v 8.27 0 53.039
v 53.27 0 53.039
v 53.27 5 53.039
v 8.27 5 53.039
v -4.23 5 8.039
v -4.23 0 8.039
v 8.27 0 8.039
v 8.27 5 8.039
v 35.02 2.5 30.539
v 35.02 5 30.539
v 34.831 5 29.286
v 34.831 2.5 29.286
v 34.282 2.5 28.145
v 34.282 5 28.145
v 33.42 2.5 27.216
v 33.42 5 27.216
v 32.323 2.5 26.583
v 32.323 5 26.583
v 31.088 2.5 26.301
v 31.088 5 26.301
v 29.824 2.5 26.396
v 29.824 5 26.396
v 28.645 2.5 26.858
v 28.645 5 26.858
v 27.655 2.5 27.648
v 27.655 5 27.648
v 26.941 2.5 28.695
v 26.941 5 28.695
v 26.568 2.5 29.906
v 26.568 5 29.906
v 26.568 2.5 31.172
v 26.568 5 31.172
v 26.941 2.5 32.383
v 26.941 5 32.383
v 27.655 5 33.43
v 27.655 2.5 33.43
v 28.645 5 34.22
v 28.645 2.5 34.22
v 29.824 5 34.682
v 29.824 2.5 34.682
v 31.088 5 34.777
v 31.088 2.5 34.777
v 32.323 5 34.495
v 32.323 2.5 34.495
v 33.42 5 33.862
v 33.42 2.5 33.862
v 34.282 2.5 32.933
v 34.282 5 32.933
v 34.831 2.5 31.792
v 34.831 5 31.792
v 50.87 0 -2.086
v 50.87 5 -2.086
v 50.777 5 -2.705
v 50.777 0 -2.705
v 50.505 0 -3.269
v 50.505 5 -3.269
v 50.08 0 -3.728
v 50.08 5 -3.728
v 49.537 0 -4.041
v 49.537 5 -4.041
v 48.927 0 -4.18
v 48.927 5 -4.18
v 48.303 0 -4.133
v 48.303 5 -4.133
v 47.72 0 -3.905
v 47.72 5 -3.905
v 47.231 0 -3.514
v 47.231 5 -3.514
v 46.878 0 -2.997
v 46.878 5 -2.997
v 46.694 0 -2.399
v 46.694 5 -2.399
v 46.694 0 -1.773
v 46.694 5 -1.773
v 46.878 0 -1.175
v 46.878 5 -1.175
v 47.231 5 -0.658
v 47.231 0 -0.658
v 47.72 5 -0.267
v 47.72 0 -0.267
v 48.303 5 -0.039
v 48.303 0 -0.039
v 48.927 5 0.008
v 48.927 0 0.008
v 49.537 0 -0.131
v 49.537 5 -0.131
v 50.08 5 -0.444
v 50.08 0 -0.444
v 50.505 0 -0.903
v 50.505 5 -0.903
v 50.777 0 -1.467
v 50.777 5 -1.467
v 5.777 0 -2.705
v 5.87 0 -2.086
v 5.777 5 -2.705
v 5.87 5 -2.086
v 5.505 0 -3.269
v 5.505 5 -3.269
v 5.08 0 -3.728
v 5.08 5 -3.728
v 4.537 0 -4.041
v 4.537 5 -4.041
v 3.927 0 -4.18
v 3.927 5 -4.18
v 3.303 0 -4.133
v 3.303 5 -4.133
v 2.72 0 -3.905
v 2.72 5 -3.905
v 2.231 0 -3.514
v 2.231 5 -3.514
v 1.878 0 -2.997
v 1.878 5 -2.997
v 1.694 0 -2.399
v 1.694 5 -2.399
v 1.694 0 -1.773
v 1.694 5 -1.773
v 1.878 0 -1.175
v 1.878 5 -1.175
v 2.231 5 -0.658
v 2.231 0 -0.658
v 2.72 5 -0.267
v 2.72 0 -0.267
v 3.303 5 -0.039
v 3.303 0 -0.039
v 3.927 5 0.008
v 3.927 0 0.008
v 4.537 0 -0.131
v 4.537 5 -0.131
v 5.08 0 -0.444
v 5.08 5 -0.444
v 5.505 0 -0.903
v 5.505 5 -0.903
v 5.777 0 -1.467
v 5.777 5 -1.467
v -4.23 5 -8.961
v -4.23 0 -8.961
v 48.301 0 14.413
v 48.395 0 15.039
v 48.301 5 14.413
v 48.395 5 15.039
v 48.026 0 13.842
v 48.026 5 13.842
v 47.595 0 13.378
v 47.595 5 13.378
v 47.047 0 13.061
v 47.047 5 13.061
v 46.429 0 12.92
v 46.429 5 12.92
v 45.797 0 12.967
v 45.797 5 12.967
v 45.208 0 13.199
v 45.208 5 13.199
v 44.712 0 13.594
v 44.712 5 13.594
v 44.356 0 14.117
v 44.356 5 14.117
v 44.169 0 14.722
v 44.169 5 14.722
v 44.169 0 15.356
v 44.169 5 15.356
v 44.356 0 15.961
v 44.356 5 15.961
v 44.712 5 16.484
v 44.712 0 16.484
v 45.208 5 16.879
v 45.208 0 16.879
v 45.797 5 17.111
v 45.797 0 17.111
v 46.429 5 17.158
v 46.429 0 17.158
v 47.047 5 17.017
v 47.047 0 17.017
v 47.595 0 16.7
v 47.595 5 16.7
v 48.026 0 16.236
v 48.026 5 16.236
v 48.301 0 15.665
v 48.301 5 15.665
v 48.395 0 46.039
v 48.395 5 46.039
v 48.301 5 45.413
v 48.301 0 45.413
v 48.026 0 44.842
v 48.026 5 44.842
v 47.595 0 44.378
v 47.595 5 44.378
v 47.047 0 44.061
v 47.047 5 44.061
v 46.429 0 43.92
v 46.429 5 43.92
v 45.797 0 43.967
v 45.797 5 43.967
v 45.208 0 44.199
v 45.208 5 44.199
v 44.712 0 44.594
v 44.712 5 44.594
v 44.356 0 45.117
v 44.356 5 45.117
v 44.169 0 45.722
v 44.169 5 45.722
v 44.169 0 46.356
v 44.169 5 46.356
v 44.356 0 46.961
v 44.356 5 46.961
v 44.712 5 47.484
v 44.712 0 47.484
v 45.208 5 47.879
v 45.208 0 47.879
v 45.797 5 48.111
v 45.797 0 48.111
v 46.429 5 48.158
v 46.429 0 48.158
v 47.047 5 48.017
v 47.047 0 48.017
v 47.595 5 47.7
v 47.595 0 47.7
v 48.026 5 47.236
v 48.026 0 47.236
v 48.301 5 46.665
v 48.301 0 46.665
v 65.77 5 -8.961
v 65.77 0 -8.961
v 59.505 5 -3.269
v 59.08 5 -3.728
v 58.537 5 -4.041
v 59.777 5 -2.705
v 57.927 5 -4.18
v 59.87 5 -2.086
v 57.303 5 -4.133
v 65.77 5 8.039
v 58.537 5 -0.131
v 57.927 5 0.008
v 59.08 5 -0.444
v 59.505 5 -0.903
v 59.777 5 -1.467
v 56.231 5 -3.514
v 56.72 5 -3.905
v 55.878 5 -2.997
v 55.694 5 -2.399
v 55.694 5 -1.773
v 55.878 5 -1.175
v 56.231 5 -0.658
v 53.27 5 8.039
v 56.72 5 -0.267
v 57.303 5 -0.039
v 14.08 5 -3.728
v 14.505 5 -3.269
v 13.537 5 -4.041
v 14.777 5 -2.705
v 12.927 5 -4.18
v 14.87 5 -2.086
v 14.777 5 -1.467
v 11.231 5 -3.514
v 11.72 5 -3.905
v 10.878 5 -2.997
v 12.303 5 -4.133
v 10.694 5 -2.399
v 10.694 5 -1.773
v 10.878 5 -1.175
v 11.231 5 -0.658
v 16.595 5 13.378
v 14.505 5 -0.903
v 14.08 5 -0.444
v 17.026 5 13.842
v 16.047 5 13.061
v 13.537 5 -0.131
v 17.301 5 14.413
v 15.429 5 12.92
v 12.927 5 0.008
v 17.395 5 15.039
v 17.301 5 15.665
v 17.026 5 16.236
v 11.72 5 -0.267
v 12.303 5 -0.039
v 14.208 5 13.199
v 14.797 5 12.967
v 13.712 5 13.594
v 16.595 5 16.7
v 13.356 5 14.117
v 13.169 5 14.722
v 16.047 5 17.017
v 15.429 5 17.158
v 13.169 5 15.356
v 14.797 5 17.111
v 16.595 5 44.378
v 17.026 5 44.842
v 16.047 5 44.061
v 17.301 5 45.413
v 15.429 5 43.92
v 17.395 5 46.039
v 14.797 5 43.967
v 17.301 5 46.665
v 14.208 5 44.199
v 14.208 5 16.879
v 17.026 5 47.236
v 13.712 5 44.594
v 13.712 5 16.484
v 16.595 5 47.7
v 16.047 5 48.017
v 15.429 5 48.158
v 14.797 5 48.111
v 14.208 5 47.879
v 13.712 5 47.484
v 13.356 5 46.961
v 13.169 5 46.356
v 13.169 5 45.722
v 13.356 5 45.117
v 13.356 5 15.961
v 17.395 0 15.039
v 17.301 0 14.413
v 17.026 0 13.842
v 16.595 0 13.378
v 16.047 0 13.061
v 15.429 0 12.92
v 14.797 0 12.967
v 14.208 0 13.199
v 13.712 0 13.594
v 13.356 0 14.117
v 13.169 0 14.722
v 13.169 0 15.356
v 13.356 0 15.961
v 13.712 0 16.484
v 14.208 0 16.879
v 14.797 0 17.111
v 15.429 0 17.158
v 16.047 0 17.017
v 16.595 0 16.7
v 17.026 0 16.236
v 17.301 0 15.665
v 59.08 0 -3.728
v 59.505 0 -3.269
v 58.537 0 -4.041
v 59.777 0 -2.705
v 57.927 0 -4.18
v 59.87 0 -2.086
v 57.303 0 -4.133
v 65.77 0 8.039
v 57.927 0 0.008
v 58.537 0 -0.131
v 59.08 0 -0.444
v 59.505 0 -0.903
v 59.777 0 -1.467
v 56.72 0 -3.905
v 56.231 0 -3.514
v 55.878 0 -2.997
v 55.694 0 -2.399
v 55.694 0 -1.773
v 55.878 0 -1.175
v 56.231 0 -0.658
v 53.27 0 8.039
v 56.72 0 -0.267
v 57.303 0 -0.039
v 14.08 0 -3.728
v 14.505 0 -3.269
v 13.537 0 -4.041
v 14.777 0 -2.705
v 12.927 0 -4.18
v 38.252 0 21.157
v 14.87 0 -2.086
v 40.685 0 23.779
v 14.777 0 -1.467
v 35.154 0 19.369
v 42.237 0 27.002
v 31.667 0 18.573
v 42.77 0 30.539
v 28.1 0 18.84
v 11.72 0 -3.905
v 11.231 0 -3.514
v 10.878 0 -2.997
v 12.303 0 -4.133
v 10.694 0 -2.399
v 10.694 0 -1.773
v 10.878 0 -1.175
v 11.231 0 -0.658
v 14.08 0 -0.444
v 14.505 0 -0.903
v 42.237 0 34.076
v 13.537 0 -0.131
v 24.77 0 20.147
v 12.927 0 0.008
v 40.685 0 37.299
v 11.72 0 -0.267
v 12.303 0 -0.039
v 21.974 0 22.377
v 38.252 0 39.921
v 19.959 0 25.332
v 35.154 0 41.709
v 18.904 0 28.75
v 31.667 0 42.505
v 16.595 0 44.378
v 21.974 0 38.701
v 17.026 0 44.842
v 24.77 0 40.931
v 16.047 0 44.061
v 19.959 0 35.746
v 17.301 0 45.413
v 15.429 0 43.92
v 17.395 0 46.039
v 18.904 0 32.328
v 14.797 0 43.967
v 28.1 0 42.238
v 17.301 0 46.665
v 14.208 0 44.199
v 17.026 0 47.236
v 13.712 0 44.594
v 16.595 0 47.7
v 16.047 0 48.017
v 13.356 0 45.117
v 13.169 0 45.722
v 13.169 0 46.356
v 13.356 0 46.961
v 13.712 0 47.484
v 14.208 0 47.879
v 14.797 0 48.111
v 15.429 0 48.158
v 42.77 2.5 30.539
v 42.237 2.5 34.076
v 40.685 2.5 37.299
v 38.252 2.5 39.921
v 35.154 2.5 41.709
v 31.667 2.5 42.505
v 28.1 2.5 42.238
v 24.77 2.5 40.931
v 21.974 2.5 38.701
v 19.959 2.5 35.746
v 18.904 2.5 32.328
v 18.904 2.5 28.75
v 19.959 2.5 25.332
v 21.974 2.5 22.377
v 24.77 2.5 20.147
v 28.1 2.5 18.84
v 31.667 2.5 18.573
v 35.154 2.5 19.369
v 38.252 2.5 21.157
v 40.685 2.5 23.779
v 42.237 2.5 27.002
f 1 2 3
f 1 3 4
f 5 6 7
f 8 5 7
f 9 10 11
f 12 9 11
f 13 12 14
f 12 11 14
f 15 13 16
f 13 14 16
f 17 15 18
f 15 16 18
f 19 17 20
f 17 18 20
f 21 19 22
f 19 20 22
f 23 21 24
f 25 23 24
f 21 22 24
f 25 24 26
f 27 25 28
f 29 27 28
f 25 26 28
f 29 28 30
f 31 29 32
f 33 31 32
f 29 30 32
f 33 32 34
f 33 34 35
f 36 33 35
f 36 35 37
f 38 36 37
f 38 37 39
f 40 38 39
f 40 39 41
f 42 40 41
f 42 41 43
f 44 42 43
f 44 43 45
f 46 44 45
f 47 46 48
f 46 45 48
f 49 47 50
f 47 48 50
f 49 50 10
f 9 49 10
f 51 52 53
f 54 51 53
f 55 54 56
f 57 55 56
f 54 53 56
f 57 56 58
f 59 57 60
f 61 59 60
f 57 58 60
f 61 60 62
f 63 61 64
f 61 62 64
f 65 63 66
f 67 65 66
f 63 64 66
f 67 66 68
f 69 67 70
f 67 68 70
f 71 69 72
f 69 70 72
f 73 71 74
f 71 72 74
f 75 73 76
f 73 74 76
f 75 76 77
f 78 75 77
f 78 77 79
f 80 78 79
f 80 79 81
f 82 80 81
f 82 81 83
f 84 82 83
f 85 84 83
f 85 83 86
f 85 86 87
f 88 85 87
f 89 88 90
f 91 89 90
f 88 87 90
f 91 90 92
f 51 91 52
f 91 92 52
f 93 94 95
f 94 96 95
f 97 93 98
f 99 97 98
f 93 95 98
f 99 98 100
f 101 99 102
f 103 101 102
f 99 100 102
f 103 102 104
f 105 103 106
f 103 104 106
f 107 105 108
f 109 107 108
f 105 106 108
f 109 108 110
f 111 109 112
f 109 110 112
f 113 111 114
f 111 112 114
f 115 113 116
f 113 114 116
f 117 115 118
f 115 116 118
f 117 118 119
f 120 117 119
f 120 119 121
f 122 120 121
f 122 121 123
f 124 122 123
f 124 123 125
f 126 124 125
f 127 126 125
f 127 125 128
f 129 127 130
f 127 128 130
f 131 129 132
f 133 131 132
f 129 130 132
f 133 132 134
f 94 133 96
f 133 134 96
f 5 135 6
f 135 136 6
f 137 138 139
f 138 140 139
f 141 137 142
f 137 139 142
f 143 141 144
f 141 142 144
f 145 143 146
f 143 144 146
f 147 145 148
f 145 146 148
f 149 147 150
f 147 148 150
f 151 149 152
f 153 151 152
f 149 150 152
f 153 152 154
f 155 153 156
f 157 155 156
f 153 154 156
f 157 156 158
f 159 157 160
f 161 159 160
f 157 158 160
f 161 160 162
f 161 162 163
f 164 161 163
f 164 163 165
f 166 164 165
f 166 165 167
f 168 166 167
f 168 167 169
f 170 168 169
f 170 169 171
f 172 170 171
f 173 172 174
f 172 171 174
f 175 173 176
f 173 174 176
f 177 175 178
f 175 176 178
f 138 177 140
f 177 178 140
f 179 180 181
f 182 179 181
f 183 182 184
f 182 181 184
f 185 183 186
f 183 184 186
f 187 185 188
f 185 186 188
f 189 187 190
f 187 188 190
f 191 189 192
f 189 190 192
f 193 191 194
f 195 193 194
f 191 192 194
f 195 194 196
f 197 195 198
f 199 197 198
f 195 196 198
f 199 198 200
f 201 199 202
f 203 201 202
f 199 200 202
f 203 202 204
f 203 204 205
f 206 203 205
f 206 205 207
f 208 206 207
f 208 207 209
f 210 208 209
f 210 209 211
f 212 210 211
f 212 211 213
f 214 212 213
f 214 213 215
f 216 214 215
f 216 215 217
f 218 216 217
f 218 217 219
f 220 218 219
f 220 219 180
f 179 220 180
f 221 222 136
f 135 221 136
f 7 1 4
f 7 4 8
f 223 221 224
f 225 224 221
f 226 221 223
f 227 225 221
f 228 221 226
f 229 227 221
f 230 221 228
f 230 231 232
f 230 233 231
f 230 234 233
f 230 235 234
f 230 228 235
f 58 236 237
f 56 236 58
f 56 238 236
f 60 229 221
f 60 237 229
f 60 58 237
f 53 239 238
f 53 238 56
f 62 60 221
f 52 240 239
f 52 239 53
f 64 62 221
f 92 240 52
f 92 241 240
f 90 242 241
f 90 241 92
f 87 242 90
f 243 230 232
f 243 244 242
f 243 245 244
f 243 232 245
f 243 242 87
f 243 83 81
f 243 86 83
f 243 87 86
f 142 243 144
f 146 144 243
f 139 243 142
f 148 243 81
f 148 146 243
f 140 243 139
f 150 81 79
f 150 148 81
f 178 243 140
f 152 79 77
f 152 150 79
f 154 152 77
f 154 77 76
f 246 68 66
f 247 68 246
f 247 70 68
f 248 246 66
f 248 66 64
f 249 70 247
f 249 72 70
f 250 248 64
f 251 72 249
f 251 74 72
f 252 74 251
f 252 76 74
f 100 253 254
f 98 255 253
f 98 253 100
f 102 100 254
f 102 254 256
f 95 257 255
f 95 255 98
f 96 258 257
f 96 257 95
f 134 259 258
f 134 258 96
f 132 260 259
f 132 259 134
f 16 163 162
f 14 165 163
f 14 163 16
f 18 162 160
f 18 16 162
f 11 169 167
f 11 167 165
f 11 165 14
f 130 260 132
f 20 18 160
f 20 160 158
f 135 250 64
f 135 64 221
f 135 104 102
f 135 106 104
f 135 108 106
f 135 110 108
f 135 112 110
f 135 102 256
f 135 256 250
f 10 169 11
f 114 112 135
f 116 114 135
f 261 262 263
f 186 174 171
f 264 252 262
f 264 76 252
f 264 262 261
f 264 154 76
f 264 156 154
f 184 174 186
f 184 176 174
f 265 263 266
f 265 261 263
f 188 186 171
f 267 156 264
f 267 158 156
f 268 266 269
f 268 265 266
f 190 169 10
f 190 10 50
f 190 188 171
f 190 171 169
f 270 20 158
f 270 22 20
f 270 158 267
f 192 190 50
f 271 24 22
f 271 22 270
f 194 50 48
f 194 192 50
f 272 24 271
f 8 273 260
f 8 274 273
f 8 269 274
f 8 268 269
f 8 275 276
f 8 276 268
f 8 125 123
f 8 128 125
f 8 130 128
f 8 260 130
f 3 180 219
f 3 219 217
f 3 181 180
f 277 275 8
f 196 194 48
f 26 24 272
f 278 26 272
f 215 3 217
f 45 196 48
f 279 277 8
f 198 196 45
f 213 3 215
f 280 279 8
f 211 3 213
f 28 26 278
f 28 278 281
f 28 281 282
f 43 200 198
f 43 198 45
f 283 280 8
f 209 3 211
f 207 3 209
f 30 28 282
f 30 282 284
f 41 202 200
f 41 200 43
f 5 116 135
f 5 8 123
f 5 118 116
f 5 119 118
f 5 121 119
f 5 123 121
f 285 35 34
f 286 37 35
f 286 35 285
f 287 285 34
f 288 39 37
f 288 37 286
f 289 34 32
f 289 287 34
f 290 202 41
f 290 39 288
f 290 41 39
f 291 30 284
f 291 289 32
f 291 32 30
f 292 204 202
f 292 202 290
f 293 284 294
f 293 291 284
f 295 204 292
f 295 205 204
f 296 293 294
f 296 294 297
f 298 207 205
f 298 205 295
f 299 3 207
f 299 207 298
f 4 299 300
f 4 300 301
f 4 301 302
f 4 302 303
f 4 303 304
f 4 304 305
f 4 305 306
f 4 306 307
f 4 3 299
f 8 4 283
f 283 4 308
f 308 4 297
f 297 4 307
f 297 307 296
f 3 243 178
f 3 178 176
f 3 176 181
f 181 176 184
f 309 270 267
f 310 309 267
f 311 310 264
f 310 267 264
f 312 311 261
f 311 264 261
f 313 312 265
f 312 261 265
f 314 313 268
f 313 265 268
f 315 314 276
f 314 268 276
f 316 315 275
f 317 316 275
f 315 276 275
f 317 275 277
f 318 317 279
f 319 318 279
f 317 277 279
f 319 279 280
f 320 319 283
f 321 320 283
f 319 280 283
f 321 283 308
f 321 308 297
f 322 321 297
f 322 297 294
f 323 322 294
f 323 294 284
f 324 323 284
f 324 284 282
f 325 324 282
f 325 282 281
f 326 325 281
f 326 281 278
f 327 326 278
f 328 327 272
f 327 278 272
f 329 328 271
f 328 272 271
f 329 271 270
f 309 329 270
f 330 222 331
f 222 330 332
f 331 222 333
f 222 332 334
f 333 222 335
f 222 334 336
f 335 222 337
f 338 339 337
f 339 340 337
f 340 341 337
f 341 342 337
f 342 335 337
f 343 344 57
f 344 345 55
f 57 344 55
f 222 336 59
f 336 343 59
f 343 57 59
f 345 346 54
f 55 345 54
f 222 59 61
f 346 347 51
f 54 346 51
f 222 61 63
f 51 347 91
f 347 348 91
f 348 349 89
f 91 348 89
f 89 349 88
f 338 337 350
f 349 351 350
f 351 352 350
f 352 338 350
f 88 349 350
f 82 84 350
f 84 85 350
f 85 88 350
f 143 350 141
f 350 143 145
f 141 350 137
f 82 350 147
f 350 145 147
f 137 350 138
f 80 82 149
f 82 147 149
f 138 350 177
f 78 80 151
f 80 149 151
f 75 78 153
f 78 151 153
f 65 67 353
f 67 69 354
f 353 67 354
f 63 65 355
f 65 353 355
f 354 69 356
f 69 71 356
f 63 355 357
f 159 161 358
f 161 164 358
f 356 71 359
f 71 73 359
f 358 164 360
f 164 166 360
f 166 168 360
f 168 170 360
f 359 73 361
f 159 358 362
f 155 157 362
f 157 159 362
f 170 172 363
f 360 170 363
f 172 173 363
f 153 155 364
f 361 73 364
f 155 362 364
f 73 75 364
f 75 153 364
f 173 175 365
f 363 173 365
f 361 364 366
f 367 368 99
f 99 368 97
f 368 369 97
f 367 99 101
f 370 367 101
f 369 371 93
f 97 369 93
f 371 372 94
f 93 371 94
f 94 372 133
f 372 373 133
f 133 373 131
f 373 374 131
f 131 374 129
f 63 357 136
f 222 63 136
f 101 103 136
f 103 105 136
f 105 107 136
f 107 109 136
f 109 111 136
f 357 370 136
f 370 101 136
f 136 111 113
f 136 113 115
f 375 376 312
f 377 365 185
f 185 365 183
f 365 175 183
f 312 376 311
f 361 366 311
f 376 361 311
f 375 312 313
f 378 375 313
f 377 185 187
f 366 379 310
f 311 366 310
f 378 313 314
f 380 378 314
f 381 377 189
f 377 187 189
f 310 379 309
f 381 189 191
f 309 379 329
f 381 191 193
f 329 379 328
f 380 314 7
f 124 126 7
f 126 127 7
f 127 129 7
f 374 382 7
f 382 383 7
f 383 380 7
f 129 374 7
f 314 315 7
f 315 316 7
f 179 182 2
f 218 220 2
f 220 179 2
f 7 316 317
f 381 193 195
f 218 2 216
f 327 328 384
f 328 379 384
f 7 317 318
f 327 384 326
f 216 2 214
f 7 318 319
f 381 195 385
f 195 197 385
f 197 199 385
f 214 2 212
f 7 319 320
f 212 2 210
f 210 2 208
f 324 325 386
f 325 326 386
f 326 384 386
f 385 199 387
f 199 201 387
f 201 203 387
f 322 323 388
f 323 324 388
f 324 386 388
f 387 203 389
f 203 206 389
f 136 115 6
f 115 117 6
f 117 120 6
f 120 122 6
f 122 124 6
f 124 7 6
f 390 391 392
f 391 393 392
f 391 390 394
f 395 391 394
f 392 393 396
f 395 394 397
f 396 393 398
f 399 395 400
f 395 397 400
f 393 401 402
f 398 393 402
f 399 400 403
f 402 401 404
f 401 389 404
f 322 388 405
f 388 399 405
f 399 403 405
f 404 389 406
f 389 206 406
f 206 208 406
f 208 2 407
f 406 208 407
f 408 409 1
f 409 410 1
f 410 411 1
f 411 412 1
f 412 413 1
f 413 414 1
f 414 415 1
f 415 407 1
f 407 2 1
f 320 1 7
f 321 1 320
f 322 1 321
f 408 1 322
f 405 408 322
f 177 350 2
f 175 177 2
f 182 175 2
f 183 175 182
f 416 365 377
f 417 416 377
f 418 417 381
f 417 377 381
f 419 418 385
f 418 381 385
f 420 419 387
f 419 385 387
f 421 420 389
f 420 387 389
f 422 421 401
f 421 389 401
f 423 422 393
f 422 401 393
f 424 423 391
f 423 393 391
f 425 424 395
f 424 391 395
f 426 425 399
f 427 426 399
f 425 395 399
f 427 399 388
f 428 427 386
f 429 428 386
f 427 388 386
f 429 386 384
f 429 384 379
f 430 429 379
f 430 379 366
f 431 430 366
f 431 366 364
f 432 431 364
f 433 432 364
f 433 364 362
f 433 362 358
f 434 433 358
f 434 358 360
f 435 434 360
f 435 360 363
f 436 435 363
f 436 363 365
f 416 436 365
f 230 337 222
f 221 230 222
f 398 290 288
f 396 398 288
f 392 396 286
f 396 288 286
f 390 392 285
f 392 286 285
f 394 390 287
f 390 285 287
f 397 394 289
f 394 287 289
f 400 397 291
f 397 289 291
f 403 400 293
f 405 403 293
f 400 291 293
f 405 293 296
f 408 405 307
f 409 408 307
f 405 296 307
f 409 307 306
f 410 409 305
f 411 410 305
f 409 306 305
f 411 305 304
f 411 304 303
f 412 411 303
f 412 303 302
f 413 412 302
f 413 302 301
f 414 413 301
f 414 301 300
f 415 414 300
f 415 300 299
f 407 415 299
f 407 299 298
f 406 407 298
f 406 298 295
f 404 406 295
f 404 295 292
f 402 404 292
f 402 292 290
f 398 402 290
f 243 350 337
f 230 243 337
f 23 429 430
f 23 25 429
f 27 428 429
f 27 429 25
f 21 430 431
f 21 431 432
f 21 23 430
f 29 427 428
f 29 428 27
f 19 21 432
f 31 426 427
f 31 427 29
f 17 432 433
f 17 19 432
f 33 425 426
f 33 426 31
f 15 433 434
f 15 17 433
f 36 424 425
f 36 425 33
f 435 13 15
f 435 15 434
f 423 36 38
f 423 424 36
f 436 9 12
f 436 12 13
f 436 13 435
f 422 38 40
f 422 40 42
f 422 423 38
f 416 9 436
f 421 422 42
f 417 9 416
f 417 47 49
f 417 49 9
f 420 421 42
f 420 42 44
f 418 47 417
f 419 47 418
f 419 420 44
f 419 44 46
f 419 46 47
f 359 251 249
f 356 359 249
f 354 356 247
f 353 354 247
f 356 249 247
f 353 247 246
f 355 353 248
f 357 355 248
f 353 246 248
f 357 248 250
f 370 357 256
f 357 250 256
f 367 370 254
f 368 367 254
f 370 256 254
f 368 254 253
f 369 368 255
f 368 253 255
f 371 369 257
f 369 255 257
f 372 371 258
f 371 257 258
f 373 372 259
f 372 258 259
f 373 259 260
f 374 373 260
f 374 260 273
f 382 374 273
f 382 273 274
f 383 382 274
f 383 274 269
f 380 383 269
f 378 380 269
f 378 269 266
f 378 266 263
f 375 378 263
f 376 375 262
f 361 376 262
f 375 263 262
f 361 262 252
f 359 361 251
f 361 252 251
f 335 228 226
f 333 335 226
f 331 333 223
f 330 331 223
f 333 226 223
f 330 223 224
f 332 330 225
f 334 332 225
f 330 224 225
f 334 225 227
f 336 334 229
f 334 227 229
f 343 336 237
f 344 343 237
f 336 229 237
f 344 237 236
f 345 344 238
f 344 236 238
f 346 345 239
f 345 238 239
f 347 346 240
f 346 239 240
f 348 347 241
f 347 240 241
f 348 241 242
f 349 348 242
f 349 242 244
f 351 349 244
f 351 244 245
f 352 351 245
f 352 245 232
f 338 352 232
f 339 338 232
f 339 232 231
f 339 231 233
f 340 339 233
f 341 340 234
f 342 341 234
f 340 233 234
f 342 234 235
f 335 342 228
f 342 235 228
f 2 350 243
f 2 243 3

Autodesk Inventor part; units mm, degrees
ref_plane "YZ Plane" through (0, 0, 0) normal (1, 0, 0) x (0, 1, 0)
ref_plane "XZ Plane" through (0, 0, 0) normal (0, 1, 0) x (-1, 0, 0)
ref_plane "XY Plane" through (0, 0, 0) normal (0, 0, 1) x (1, 0, 0)
sketch "Skizze1" plane through (0, 0, 0) normal (0, 1, 0) x (-1, 0, 0)
  line L0 (4.2298, 8.039) -> (-65.7702, 8.039)
  line L1 (-65.7702, 8.039) -> (-65.7702, -8.961)
  line L2 (-65.7702, -8.961) -> (4.2298, -8.961)
  line L3 (4.2298, -8.961) -> (4.2298, 8.039)
  line L4 (-8.2702, 8.039) -> (-53.2702, 8.039)
  line L5 (-53.2702, 8.039) -> (-53.2702, 53.039)
  line L6 (-53.2702, 53.039) -> (-8.2702, 53.039)
  line L7 (-8.2702, 53.039) -> (-8.2702, 8.039)
  point P0 (0, 0)
  dimension "d0" = 70
  dimension "d1" = 17
  dimension "d2" = 45
  dimension "d3" = 45
  dimension "d4" = 12.5
extrude "Extrusion1" add sketch "Skizze1" along normal blind 5
sketch "Skizze2" plane through (0, 5, 0) normal (0, 1, 0) x (1, 0, 0)
  point P0 (0, 0)
sketch "Skizze3" plane through (0, 5, 0) normal (0, 1, 0) x (1, 0, 0)
  circle A0 centre (0, 0) radius 2.1
  circle A1 centre (12.7702, 2.086) radius 2.1
  circle A2 centre (48.7702, 2.086) radius 2.1
  circle A3 centre (57.7702, 2.086) radius 2.1
  line L0 (65.7702, -8.039) -> (65.7702, 8.961) projected
  line L1 (65.7702, 8.961) -> (-4.2298, 8.961) projected
  line L2 (-4.2298, 8.961) -> (-4.2298, -8.039) projected
  dimension "d7" = 4.2
  dimension "d8" = 4.2
  dimension "d9" = 4.2
  dimension "d10" = 4.2
  dimension "d11" = 8
  dimension "d12" = 17
  dimension "d13" = 6.875
  dimension "d14" = 6.875
  dimension "d15" = 6.875
  dimension "d16" = 8.961
  dimension "d17" = 17
sketch "Skizze4" plane through (0, 5, 0) normal (0, 1, 0) x (1, 0, 0)
  circle A0 centre (3.7702, 2.086) radius 2.1
  line L0 (65.7702, 8.961) -> (-4.2298, 8.961) projected
  line L1 (-4.2298, 8.961) -> (-4.2298, -8.039) projected
  point P0 (0, 0)
  dimension "d18" = 4.2
  dimension "d19" = 6.875
  dimension "d20" = 8
extrude "Extrusion2" cut sketch "Skizze4" against normal blind 20
extrude "Extrusion3" cut sketch "Skizze3" against normal blind 20 contours A1 | A2 | A3
sketch "Skizze5" plane through (0, 5, 0) normal (0, 1, 0) x (1, 0, 0)
  line L0 (9.6202, -51.689) -> (51.9202, -51.689)
  line L1 (51.9202, -51.689) -> (51.9202, -9.389)
  line L2 (51.9202, -9.389) -> (9.6202, -9.389)
  line L3 (9.6202, -9.389) -> (9.6202, -51.689)
  line L4 (8.2702, -8.039) -> (8.2702, -53.039) projected
  line L5 (8.2702, -53.039) -> (53.2702, -53.039) projected
  line L6 (15.2702, -46.039) -> (46.2702, -46.039)
  line L7 (46.2702, -46.039) -> (46.2702, -15.039)
  line L8 (46.2702, -15.039) -> (15.2702, -15.039)
  line L9 (15.2702, -15.039) -> (15.2702, -46.039)
  circle A0 centre (15.2702, -46.039) radius 2.125
  circle A1 centre (15.2702, -15.039) radius 2.125
  circle A2 centre (46.2702, -46.039) radius 2.125
  circle A3 centre (46.2702, -15.039) radius 2.125
  line L10 (15.2702, -46.039) -> (46.2702, -15.039)
  line L11 (46.2702, -46.039) -> (15.2702, -15.039)
  circle A4 centre (30.7702, -30.539) radius 4.25
  point P0 (0, 0)
  dimension "d25" = 42.3
  dimension "d26" = 42.3
  dimension "d27" = 1.35
  dimension "d28" = 1.35
  dimension "d29" = 31
  dimension "d30" = 31
  dimension "d31" = 5.65
  dimension "d32" = 5.65
  dimension "d33" = 4.25
  dimension "d34" = 4.25
  dimension "d35" = 4.25
  dimension "d36" = 4.25
  dimension "d37" = 8.5
extrude "Extrusion4" cut sketch "Skizze5" against normal blind 20 contours L10 A0 L6 | L6 A0 L9 | L9 A0 L10 | A2 L11 L6 | L6 L7 A2 | A1 L8 L9 | L9 L11 A1 | A4 L11 L10 | L10 L11 A4 | L11 A2 L7 | L8 A1 L11 | L11 A4 L10 | L10 A4 L11 | A3 L7 L8 | L8 L10 A3 | A3 L10 L7
sketch "Skizze6" plane through (0, 0, 0) normal (0, -1, 0) x (1, 0, 0)
  circle A0 centre (46.2702, 46.039) radius 2.125 projected
  circle A1 centre (15.2702, 15.039) radius 2.125 projected
  line L0 (46.2702, 46.039) -> (15.2702, 46.039)
  line L1 (15.2702, 46.039) -> (15.2702, 15.039)
  line L2 (15.2702, 15.039) -> (46.2702, 15.039)
  line L3 (46.2702, 15.039) -> (46.2702, 46.039)
  line L4 (15.2702, 15.039) -> (46.2702, 46.039)
  line L5 (46.2702, 15.039) -> (15.2702, 46.039)
  circle A2 centre (30.7702, 30.539) radius 12
  point P0 (0, 0)
  dimension "d40" = 24
extrude "Extrusion5" cut sketch "Skizze6" against normal blind 2.5 contours A2 L5 L4 | L4 L5 A2 | L5 L4 A2 | A2 L4 L5
properties part number "YAchseMotorteil"
